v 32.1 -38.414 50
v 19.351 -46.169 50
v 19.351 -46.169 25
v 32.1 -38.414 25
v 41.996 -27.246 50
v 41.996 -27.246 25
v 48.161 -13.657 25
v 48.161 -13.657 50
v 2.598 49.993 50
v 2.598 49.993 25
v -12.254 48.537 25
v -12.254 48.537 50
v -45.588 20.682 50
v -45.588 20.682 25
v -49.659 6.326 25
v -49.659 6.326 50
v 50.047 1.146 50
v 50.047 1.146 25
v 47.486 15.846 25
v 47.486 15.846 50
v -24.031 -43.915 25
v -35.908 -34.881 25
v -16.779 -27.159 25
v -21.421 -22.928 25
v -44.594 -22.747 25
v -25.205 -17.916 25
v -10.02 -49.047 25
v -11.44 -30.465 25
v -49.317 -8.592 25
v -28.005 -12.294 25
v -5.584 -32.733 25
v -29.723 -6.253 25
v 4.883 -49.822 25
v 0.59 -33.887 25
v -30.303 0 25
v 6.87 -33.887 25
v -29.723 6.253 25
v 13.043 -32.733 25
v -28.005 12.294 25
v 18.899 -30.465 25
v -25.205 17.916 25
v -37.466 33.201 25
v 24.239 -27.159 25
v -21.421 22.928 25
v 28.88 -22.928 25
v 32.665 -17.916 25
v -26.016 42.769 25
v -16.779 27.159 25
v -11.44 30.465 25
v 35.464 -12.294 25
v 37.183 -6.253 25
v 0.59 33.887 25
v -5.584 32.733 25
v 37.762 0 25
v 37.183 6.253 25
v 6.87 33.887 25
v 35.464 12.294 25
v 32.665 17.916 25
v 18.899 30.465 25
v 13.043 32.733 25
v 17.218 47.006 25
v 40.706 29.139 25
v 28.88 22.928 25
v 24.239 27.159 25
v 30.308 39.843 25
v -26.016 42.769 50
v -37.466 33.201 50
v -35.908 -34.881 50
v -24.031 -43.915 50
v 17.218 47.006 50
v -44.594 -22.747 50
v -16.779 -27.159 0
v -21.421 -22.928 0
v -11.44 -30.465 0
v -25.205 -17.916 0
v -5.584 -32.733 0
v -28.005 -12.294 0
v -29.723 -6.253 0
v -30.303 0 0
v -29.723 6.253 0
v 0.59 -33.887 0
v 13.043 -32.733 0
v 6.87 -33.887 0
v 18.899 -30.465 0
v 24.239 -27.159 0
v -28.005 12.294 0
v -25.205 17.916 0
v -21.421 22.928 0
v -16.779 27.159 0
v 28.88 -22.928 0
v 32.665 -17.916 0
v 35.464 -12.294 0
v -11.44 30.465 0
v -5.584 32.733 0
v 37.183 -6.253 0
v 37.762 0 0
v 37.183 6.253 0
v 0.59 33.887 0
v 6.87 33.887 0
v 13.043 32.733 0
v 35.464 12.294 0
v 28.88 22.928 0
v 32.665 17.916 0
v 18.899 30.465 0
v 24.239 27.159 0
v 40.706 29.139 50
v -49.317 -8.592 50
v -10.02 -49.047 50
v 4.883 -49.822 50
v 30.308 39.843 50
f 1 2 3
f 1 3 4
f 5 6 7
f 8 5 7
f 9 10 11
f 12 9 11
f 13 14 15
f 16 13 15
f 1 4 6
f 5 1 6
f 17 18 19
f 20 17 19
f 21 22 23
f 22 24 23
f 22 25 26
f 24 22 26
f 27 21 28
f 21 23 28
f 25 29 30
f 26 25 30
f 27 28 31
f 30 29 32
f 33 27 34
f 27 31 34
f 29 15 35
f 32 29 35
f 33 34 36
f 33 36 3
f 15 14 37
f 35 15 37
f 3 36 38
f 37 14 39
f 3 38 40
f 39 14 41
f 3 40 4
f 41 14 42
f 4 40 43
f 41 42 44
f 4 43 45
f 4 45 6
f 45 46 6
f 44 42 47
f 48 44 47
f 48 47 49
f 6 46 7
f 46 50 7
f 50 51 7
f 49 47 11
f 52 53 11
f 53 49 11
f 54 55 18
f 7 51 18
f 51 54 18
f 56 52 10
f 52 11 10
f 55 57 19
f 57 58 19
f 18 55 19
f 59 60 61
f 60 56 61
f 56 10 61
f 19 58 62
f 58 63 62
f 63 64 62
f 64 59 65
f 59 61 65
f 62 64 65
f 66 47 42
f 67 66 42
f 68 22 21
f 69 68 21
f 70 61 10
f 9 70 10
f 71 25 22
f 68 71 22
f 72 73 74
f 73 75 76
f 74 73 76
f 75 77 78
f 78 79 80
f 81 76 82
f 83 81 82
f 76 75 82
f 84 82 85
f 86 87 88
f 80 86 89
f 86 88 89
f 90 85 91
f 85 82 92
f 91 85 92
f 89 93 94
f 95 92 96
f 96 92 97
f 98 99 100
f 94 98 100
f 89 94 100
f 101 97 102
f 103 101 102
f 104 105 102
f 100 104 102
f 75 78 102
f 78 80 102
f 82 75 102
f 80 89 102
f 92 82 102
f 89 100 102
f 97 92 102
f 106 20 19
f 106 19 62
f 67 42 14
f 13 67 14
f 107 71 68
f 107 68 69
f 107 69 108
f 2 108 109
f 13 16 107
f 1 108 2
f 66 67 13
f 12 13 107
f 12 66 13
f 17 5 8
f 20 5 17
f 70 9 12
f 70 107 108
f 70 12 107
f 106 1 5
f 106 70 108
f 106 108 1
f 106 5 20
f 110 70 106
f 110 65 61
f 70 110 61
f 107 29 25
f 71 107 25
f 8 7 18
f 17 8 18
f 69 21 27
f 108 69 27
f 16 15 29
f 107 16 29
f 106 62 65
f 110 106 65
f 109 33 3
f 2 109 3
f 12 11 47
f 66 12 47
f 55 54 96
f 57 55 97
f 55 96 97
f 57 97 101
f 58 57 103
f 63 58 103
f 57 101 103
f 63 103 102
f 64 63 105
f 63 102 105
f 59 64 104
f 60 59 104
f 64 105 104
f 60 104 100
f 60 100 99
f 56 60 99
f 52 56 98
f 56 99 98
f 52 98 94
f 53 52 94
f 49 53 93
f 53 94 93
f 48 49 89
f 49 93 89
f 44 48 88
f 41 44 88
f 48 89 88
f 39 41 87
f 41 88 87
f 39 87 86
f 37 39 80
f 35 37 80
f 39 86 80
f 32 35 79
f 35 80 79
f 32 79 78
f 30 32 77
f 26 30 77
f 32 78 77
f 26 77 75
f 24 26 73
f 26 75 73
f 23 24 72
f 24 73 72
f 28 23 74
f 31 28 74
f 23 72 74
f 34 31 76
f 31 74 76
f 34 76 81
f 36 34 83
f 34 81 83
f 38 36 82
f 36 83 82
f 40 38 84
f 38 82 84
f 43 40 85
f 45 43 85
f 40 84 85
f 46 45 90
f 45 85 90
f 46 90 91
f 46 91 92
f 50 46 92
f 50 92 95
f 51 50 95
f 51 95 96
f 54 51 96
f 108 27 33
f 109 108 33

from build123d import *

# Parameters (mm, degrees)
F0_R     = 34.032564
F1_DEPTH = 25
F3_DEPTH = 25


with BuildPart() as f1:
    # F0 (on Top) → F1 (new body)
    with BuildSketch(Plane.XY):
        with Locations((3.729817, 0)):
            Circle(F0_R)
    extrude(amount=F1_DEPTH)

    # F2 (on face) → F3 (join)
    with BuildSketch(Plane.XY.offset(25)):
        Polygon((2.597546, 49.992847), (-12.253506, 48.537445), (-26.015781, 42.769278), (-37.466439, 33.200873), (-45.588039, 20.682425), (-49.658942, 6.326253), (-49.31743, -8.592035), (-44.593849, -22.746883), (-35.907907, -34.880571), (-24.031391, -43.914966), (-10.01958, -49.047324), (4.882514, -49.821613), (19.350776, -46.169032), (32.099636, -38.41413), (41.996303, -27.245964), (48.161414, -13.656875), (50.047172, 1.145688), (47.486019, 15.846451), (40.705525, 29.139187), (30.308167, 39.842779), (17.217794, 47.006165), align=None)
    extrude(amount=F3_DEPTH)


solid = f1.part
